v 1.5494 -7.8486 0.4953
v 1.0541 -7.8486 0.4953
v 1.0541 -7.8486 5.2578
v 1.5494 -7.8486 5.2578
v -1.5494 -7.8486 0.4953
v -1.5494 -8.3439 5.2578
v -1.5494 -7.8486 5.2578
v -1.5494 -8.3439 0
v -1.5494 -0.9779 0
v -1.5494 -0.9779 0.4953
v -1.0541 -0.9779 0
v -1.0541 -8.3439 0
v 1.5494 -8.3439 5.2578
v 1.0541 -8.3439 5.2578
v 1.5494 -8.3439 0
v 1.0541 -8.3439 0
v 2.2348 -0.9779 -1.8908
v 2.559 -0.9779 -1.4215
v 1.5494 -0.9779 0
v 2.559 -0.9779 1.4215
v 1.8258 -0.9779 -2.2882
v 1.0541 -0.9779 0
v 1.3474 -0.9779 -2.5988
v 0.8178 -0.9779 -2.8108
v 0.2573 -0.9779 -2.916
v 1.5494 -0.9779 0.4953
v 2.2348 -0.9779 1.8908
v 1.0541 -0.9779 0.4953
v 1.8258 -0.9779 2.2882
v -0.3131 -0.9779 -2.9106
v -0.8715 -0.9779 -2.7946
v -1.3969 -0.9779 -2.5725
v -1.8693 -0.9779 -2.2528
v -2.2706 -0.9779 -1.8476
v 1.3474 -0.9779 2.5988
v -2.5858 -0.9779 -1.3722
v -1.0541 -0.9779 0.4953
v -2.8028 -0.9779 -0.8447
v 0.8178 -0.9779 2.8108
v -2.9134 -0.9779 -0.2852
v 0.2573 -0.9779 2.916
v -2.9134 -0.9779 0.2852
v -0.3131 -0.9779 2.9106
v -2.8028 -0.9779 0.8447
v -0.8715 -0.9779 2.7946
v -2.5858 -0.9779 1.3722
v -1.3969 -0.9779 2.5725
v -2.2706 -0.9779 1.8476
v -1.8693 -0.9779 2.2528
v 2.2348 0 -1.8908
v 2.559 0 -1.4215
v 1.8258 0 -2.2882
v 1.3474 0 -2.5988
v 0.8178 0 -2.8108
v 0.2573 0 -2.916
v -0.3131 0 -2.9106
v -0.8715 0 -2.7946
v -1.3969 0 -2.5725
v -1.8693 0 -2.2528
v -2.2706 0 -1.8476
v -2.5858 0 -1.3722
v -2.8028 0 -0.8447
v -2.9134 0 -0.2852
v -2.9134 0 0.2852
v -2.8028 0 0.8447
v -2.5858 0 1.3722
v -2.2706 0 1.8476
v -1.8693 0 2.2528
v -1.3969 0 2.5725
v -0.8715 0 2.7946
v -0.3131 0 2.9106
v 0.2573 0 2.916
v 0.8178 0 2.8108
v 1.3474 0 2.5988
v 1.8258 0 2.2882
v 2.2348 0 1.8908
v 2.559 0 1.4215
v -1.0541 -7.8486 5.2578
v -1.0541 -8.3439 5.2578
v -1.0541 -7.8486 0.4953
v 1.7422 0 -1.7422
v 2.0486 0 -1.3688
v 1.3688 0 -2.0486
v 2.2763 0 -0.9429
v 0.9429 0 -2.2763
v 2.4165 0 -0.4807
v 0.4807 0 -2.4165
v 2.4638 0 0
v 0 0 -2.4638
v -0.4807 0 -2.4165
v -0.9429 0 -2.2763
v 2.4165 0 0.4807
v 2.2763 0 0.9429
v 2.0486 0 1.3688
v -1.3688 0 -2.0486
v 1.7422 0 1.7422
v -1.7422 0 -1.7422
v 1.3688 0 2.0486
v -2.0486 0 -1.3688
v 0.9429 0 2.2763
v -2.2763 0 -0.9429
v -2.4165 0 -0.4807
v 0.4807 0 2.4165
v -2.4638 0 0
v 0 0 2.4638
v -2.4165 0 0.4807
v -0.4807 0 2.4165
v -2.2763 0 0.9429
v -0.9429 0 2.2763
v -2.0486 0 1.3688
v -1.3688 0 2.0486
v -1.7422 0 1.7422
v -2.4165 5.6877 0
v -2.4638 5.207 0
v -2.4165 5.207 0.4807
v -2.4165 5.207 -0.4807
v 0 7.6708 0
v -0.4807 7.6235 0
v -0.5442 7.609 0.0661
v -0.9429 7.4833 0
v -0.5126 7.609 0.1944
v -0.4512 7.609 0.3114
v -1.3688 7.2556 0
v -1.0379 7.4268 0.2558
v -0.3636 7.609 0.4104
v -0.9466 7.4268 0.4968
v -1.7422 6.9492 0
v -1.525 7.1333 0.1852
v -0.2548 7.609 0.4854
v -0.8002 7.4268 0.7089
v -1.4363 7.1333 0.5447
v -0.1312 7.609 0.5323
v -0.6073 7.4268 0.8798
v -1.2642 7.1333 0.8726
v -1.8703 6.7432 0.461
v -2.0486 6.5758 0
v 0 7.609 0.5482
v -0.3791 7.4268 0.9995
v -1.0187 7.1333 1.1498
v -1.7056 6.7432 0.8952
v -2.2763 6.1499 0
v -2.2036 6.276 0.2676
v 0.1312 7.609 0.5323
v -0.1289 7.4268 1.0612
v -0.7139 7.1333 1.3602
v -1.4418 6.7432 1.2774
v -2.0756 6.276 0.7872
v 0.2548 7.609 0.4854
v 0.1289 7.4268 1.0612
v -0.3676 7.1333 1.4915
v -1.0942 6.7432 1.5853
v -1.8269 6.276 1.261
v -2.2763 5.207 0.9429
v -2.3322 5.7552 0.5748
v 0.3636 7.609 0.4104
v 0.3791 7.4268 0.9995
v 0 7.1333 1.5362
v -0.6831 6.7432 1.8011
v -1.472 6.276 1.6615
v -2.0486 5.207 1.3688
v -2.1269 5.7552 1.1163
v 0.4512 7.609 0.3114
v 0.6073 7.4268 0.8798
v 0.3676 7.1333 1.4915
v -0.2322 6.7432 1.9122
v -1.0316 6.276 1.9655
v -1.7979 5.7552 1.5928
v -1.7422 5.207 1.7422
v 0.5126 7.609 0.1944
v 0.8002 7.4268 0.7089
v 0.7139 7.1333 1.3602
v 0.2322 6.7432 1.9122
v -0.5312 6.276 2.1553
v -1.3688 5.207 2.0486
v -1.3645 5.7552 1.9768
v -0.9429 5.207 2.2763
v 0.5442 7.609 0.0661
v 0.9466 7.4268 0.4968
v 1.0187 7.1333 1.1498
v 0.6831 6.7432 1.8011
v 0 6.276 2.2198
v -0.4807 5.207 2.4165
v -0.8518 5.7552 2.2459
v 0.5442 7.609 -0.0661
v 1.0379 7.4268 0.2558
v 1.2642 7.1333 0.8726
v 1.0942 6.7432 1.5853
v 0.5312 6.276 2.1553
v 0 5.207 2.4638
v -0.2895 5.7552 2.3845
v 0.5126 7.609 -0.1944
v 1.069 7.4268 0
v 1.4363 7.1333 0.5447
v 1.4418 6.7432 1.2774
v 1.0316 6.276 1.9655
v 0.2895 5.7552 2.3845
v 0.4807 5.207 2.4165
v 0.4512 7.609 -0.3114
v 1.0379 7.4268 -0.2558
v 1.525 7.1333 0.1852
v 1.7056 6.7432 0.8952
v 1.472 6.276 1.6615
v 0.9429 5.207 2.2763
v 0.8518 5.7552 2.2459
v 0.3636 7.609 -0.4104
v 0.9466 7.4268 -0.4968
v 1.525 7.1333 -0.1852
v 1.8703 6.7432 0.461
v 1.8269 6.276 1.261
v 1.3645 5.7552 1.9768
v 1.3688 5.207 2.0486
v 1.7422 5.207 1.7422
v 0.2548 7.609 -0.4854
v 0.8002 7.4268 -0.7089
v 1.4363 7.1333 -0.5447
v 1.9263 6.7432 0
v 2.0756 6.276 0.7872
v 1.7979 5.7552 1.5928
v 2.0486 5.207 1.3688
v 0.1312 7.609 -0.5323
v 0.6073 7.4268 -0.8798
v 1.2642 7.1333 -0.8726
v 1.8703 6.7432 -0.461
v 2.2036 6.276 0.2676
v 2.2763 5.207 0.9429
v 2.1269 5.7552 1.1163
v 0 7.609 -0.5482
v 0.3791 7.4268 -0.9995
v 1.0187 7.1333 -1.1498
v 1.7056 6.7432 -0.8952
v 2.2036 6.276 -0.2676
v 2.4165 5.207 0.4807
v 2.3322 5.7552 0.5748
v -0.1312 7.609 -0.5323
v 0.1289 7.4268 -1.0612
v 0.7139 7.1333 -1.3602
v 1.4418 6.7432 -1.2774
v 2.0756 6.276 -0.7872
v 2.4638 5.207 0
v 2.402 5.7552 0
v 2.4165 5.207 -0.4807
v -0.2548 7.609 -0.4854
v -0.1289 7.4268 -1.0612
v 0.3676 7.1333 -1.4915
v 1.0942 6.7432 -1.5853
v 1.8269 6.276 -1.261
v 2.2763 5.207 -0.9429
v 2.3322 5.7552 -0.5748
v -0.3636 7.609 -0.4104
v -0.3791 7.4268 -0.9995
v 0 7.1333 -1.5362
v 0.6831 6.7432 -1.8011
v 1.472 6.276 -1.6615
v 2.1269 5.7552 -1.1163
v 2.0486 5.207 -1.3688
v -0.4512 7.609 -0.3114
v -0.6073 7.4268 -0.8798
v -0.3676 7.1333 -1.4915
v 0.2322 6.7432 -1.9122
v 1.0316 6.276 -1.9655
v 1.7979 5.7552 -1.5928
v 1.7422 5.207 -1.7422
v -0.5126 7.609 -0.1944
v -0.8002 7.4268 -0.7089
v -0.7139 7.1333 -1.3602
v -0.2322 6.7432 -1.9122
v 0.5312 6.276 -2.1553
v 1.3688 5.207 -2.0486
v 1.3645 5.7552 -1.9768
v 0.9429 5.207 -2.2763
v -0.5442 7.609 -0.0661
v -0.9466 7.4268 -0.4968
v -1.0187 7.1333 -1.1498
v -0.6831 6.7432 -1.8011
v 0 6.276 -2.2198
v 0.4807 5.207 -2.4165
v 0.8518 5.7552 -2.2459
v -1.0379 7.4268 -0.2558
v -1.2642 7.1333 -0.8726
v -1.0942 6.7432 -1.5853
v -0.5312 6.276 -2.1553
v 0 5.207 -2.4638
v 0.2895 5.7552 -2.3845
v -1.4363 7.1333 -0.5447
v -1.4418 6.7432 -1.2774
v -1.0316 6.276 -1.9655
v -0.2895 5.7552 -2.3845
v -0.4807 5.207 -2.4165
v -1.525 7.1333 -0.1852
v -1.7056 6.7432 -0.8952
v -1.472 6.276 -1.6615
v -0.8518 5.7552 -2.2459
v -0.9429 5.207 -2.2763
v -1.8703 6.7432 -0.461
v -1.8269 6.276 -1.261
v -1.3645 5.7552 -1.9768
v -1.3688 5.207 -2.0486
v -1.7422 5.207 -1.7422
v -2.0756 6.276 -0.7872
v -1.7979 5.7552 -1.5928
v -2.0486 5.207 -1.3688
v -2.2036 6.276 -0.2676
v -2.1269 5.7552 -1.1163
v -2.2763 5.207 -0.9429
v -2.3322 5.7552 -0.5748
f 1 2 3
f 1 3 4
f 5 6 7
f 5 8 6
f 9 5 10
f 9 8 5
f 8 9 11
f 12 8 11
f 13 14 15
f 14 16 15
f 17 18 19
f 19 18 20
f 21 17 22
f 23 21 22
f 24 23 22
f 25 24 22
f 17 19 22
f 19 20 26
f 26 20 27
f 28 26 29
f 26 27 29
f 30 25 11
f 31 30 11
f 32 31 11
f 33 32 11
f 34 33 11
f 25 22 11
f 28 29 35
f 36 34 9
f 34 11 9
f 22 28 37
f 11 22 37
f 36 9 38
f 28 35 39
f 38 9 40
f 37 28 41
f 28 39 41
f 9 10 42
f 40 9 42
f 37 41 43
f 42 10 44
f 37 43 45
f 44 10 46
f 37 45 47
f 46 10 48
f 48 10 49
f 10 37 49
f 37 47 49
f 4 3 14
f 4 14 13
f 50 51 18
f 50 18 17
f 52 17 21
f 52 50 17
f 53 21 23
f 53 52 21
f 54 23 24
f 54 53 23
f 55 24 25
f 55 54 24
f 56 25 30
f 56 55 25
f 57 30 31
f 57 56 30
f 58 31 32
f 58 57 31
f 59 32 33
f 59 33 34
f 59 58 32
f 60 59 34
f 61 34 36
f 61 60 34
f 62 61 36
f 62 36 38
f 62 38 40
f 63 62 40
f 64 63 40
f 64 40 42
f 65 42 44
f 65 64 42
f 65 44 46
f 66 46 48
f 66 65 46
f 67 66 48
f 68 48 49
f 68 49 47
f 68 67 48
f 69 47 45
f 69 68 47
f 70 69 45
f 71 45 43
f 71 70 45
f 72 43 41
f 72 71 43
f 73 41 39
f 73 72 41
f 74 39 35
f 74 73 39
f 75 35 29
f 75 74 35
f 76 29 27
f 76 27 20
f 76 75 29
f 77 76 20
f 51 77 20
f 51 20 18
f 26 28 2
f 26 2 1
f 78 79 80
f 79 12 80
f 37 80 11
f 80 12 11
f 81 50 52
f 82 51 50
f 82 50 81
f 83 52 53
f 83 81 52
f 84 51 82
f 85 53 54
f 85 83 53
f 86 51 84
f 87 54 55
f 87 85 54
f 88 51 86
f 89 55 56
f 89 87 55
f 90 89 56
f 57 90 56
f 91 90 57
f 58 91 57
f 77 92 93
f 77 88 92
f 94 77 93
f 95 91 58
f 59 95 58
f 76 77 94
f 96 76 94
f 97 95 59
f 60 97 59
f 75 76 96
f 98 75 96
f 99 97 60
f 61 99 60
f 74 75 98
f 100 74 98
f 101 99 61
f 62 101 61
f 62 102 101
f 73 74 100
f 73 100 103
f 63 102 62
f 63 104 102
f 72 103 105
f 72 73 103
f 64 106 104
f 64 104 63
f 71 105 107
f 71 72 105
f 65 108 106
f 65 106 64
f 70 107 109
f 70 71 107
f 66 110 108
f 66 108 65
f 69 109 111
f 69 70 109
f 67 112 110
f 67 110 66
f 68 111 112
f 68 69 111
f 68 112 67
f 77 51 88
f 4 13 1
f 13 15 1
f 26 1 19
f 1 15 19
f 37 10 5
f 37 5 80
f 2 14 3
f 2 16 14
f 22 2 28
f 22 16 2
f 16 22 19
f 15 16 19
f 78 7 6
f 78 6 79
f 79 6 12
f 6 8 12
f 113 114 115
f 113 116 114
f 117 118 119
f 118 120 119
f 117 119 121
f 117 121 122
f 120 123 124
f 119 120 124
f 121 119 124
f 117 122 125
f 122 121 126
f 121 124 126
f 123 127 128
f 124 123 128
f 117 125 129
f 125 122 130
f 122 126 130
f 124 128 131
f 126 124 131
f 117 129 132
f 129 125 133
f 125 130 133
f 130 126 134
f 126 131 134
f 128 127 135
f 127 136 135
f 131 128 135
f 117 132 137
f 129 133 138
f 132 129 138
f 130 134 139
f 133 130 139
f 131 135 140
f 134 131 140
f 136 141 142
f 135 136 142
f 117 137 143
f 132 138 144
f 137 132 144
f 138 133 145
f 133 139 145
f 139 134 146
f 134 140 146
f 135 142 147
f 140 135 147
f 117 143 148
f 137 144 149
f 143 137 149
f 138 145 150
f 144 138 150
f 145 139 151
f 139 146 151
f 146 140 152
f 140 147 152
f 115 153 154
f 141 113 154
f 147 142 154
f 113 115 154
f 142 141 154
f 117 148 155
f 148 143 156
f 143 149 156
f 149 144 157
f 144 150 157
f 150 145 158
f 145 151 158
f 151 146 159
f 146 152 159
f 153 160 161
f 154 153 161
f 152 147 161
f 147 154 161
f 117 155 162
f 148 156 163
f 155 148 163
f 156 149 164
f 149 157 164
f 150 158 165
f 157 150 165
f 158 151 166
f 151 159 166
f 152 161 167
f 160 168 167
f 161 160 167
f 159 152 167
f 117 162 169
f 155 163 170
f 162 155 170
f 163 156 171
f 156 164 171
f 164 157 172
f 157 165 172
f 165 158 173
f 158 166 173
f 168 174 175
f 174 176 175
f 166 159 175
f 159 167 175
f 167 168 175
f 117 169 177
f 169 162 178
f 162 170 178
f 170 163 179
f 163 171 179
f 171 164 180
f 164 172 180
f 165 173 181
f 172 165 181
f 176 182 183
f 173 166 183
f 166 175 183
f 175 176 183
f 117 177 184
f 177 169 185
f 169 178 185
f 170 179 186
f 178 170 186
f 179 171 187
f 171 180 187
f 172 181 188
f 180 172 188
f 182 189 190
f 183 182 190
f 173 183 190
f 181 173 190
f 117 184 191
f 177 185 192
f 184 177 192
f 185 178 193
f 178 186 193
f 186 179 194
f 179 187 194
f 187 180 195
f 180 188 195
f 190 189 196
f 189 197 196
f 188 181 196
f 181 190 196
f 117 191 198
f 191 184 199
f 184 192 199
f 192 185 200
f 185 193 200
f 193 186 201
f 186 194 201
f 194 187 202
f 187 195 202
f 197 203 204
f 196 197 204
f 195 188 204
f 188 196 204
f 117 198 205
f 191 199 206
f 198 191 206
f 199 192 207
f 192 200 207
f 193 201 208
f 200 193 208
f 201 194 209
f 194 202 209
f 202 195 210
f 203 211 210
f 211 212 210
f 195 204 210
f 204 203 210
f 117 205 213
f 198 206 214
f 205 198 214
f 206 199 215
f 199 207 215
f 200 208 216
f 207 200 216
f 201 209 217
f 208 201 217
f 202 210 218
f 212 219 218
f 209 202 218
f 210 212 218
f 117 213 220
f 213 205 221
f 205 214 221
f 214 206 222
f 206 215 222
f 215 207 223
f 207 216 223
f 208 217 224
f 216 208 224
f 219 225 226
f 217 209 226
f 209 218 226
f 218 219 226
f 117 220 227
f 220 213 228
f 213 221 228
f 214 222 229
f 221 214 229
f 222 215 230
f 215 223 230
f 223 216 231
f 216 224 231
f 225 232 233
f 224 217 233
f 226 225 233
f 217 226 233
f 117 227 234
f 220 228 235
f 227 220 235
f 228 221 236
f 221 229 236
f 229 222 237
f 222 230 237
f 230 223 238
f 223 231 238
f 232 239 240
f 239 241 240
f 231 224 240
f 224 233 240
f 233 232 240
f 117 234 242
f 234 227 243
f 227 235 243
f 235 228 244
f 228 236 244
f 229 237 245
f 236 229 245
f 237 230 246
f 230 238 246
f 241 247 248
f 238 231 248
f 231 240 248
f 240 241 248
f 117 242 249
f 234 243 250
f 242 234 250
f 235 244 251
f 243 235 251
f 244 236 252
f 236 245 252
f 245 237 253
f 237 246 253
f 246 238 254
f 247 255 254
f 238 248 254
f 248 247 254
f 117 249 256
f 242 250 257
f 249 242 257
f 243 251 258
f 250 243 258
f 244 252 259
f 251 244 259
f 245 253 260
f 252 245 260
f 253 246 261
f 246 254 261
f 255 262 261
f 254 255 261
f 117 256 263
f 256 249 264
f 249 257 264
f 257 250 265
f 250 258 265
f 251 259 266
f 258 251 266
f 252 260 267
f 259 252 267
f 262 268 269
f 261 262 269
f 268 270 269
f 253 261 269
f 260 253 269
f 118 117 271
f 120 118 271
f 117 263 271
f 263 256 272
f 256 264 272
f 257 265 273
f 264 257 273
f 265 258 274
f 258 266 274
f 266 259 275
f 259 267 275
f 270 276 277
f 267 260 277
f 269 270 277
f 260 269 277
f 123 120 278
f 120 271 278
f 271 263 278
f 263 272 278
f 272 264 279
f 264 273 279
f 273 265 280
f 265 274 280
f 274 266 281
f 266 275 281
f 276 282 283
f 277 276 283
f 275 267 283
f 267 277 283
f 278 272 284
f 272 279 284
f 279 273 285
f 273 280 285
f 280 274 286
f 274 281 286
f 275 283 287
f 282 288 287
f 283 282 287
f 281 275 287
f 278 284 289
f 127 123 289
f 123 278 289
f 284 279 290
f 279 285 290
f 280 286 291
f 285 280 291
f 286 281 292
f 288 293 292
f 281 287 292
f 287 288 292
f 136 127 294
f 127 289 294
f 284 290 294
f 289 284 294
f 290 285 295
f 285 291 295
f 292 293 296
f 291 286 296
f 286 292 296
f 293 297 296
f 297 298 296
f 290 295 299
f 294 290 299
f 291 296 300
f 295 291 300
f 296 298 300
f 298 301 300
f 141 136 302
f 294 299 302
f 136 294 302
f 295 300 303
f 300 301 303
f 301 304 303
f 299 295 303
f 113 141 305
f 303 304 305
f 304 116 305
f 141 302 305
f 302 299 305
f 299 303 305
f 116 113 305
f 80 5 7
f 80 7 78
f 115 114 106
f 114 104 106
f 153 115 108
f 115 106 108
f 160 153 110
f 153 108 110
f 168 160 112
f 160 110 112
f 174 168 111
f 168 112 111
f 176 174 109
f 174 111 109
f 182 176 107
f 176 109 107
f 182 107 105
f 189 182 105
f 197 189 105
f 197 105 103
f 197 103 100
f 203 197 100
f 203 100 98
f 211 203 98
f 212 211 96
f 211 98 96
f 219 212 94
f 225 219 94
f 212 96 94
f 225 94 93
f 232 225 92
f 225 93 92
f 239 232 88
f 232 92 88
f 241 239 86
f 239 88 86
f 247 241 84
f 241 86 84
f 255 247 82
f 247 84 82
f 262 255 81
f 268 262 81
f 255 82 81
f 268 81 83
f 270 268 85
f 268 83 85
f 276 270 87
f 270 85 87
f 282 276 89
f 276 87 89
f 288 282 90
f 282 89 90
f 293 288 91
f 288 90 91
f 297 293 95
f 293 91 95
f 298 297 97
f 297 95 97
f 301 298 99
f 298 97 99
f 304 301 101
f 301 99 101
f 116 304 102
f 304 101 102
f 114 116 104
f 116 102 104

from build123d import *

# Parameters (mm, degrees)
BOSS_EXTRUDE2_DEPTH = 0.9779
SKETCH5_W           = 0.4953
SKETCH5_H           = 7.366
BOSS_EXTRUDE3_DEPTH = 0.4953
SKETCH6_W           = 0.4953
SKETCH6_H           = 0.4953
BOSS_EXTRUDE4_DEPTH = 4.7625
SKETCH7_W           = 0.4953
SKETCH7_H           = 0.4953
BOSS_EXTRUDE5_DEPTH = 4.7625


with BuildPart() as part:
    # Sketch3 → Revolve1 (revolve)
    with BuildSketch(Plane.XY):
        with BuildLine():
            Line((-2.4638, 5.207), (-2.4638, 0))
            Line((-2.4638, 0), (0, 0))
            Line((0, 0), (0, 7.6708))
            ThreePointArc((0, 7.6708), (-1.742169687, 6.949169687), (-2.4638, 5.207))
        make_face()
    revolve(axis=Axis((0, 0, 0), (0, 1, 0)))

    # Sketch4 → Boss-Extrude2 (add)
    with BuildSketch(Plane.XZ):
        with BuildLine():
            Line((2.55905, 1.421492568), (2.55905, -1.421492568))
            ThreePointArc((2.55905, -1.421492568), (-2.92735, 0), (2.55905, 1.421492568))
        make_face()
    extrude(amount=BOSS_EXTRUDE2_DEPTH)

    # Sketch5 → Boss-Extrude3 (add)
    with BuildSketch(Plane.XY):
        with Locations((-1.30175, -4.6609)):
            Rectangle(SKETCH5_W, SKETCH5_H)
        with Locations((1.30175, -4.6609)):
            Rectangle(SKETCH5_W, SKETCH5_H)
    extrude(amount=BOSS_EXTRUDE3_DEPTH)

    # Sketch6 → Boss-Extrude4 (add)
    with BuildSketch(Plane.XY.offset(0.4953)):
        with Locations((-1.30175, -8.09625)):
            Rectangle(SKETCH6_W, SKETCH6_H)
    extrude(amount=BOSS_EXTRUDE4_DEPTH)

    # Sketch7 → Boss-Extrude5 (add)
    with BuildSketch(Plane.XY.offset(0.4953)):
        with Locations((1.30175, -8.09625)):
            Rectangle(SKETCH7_W, SKETCH7_H)
    extrude(amount=BOSS_EXTRUDE5_DEPTH)


solid = part.part
